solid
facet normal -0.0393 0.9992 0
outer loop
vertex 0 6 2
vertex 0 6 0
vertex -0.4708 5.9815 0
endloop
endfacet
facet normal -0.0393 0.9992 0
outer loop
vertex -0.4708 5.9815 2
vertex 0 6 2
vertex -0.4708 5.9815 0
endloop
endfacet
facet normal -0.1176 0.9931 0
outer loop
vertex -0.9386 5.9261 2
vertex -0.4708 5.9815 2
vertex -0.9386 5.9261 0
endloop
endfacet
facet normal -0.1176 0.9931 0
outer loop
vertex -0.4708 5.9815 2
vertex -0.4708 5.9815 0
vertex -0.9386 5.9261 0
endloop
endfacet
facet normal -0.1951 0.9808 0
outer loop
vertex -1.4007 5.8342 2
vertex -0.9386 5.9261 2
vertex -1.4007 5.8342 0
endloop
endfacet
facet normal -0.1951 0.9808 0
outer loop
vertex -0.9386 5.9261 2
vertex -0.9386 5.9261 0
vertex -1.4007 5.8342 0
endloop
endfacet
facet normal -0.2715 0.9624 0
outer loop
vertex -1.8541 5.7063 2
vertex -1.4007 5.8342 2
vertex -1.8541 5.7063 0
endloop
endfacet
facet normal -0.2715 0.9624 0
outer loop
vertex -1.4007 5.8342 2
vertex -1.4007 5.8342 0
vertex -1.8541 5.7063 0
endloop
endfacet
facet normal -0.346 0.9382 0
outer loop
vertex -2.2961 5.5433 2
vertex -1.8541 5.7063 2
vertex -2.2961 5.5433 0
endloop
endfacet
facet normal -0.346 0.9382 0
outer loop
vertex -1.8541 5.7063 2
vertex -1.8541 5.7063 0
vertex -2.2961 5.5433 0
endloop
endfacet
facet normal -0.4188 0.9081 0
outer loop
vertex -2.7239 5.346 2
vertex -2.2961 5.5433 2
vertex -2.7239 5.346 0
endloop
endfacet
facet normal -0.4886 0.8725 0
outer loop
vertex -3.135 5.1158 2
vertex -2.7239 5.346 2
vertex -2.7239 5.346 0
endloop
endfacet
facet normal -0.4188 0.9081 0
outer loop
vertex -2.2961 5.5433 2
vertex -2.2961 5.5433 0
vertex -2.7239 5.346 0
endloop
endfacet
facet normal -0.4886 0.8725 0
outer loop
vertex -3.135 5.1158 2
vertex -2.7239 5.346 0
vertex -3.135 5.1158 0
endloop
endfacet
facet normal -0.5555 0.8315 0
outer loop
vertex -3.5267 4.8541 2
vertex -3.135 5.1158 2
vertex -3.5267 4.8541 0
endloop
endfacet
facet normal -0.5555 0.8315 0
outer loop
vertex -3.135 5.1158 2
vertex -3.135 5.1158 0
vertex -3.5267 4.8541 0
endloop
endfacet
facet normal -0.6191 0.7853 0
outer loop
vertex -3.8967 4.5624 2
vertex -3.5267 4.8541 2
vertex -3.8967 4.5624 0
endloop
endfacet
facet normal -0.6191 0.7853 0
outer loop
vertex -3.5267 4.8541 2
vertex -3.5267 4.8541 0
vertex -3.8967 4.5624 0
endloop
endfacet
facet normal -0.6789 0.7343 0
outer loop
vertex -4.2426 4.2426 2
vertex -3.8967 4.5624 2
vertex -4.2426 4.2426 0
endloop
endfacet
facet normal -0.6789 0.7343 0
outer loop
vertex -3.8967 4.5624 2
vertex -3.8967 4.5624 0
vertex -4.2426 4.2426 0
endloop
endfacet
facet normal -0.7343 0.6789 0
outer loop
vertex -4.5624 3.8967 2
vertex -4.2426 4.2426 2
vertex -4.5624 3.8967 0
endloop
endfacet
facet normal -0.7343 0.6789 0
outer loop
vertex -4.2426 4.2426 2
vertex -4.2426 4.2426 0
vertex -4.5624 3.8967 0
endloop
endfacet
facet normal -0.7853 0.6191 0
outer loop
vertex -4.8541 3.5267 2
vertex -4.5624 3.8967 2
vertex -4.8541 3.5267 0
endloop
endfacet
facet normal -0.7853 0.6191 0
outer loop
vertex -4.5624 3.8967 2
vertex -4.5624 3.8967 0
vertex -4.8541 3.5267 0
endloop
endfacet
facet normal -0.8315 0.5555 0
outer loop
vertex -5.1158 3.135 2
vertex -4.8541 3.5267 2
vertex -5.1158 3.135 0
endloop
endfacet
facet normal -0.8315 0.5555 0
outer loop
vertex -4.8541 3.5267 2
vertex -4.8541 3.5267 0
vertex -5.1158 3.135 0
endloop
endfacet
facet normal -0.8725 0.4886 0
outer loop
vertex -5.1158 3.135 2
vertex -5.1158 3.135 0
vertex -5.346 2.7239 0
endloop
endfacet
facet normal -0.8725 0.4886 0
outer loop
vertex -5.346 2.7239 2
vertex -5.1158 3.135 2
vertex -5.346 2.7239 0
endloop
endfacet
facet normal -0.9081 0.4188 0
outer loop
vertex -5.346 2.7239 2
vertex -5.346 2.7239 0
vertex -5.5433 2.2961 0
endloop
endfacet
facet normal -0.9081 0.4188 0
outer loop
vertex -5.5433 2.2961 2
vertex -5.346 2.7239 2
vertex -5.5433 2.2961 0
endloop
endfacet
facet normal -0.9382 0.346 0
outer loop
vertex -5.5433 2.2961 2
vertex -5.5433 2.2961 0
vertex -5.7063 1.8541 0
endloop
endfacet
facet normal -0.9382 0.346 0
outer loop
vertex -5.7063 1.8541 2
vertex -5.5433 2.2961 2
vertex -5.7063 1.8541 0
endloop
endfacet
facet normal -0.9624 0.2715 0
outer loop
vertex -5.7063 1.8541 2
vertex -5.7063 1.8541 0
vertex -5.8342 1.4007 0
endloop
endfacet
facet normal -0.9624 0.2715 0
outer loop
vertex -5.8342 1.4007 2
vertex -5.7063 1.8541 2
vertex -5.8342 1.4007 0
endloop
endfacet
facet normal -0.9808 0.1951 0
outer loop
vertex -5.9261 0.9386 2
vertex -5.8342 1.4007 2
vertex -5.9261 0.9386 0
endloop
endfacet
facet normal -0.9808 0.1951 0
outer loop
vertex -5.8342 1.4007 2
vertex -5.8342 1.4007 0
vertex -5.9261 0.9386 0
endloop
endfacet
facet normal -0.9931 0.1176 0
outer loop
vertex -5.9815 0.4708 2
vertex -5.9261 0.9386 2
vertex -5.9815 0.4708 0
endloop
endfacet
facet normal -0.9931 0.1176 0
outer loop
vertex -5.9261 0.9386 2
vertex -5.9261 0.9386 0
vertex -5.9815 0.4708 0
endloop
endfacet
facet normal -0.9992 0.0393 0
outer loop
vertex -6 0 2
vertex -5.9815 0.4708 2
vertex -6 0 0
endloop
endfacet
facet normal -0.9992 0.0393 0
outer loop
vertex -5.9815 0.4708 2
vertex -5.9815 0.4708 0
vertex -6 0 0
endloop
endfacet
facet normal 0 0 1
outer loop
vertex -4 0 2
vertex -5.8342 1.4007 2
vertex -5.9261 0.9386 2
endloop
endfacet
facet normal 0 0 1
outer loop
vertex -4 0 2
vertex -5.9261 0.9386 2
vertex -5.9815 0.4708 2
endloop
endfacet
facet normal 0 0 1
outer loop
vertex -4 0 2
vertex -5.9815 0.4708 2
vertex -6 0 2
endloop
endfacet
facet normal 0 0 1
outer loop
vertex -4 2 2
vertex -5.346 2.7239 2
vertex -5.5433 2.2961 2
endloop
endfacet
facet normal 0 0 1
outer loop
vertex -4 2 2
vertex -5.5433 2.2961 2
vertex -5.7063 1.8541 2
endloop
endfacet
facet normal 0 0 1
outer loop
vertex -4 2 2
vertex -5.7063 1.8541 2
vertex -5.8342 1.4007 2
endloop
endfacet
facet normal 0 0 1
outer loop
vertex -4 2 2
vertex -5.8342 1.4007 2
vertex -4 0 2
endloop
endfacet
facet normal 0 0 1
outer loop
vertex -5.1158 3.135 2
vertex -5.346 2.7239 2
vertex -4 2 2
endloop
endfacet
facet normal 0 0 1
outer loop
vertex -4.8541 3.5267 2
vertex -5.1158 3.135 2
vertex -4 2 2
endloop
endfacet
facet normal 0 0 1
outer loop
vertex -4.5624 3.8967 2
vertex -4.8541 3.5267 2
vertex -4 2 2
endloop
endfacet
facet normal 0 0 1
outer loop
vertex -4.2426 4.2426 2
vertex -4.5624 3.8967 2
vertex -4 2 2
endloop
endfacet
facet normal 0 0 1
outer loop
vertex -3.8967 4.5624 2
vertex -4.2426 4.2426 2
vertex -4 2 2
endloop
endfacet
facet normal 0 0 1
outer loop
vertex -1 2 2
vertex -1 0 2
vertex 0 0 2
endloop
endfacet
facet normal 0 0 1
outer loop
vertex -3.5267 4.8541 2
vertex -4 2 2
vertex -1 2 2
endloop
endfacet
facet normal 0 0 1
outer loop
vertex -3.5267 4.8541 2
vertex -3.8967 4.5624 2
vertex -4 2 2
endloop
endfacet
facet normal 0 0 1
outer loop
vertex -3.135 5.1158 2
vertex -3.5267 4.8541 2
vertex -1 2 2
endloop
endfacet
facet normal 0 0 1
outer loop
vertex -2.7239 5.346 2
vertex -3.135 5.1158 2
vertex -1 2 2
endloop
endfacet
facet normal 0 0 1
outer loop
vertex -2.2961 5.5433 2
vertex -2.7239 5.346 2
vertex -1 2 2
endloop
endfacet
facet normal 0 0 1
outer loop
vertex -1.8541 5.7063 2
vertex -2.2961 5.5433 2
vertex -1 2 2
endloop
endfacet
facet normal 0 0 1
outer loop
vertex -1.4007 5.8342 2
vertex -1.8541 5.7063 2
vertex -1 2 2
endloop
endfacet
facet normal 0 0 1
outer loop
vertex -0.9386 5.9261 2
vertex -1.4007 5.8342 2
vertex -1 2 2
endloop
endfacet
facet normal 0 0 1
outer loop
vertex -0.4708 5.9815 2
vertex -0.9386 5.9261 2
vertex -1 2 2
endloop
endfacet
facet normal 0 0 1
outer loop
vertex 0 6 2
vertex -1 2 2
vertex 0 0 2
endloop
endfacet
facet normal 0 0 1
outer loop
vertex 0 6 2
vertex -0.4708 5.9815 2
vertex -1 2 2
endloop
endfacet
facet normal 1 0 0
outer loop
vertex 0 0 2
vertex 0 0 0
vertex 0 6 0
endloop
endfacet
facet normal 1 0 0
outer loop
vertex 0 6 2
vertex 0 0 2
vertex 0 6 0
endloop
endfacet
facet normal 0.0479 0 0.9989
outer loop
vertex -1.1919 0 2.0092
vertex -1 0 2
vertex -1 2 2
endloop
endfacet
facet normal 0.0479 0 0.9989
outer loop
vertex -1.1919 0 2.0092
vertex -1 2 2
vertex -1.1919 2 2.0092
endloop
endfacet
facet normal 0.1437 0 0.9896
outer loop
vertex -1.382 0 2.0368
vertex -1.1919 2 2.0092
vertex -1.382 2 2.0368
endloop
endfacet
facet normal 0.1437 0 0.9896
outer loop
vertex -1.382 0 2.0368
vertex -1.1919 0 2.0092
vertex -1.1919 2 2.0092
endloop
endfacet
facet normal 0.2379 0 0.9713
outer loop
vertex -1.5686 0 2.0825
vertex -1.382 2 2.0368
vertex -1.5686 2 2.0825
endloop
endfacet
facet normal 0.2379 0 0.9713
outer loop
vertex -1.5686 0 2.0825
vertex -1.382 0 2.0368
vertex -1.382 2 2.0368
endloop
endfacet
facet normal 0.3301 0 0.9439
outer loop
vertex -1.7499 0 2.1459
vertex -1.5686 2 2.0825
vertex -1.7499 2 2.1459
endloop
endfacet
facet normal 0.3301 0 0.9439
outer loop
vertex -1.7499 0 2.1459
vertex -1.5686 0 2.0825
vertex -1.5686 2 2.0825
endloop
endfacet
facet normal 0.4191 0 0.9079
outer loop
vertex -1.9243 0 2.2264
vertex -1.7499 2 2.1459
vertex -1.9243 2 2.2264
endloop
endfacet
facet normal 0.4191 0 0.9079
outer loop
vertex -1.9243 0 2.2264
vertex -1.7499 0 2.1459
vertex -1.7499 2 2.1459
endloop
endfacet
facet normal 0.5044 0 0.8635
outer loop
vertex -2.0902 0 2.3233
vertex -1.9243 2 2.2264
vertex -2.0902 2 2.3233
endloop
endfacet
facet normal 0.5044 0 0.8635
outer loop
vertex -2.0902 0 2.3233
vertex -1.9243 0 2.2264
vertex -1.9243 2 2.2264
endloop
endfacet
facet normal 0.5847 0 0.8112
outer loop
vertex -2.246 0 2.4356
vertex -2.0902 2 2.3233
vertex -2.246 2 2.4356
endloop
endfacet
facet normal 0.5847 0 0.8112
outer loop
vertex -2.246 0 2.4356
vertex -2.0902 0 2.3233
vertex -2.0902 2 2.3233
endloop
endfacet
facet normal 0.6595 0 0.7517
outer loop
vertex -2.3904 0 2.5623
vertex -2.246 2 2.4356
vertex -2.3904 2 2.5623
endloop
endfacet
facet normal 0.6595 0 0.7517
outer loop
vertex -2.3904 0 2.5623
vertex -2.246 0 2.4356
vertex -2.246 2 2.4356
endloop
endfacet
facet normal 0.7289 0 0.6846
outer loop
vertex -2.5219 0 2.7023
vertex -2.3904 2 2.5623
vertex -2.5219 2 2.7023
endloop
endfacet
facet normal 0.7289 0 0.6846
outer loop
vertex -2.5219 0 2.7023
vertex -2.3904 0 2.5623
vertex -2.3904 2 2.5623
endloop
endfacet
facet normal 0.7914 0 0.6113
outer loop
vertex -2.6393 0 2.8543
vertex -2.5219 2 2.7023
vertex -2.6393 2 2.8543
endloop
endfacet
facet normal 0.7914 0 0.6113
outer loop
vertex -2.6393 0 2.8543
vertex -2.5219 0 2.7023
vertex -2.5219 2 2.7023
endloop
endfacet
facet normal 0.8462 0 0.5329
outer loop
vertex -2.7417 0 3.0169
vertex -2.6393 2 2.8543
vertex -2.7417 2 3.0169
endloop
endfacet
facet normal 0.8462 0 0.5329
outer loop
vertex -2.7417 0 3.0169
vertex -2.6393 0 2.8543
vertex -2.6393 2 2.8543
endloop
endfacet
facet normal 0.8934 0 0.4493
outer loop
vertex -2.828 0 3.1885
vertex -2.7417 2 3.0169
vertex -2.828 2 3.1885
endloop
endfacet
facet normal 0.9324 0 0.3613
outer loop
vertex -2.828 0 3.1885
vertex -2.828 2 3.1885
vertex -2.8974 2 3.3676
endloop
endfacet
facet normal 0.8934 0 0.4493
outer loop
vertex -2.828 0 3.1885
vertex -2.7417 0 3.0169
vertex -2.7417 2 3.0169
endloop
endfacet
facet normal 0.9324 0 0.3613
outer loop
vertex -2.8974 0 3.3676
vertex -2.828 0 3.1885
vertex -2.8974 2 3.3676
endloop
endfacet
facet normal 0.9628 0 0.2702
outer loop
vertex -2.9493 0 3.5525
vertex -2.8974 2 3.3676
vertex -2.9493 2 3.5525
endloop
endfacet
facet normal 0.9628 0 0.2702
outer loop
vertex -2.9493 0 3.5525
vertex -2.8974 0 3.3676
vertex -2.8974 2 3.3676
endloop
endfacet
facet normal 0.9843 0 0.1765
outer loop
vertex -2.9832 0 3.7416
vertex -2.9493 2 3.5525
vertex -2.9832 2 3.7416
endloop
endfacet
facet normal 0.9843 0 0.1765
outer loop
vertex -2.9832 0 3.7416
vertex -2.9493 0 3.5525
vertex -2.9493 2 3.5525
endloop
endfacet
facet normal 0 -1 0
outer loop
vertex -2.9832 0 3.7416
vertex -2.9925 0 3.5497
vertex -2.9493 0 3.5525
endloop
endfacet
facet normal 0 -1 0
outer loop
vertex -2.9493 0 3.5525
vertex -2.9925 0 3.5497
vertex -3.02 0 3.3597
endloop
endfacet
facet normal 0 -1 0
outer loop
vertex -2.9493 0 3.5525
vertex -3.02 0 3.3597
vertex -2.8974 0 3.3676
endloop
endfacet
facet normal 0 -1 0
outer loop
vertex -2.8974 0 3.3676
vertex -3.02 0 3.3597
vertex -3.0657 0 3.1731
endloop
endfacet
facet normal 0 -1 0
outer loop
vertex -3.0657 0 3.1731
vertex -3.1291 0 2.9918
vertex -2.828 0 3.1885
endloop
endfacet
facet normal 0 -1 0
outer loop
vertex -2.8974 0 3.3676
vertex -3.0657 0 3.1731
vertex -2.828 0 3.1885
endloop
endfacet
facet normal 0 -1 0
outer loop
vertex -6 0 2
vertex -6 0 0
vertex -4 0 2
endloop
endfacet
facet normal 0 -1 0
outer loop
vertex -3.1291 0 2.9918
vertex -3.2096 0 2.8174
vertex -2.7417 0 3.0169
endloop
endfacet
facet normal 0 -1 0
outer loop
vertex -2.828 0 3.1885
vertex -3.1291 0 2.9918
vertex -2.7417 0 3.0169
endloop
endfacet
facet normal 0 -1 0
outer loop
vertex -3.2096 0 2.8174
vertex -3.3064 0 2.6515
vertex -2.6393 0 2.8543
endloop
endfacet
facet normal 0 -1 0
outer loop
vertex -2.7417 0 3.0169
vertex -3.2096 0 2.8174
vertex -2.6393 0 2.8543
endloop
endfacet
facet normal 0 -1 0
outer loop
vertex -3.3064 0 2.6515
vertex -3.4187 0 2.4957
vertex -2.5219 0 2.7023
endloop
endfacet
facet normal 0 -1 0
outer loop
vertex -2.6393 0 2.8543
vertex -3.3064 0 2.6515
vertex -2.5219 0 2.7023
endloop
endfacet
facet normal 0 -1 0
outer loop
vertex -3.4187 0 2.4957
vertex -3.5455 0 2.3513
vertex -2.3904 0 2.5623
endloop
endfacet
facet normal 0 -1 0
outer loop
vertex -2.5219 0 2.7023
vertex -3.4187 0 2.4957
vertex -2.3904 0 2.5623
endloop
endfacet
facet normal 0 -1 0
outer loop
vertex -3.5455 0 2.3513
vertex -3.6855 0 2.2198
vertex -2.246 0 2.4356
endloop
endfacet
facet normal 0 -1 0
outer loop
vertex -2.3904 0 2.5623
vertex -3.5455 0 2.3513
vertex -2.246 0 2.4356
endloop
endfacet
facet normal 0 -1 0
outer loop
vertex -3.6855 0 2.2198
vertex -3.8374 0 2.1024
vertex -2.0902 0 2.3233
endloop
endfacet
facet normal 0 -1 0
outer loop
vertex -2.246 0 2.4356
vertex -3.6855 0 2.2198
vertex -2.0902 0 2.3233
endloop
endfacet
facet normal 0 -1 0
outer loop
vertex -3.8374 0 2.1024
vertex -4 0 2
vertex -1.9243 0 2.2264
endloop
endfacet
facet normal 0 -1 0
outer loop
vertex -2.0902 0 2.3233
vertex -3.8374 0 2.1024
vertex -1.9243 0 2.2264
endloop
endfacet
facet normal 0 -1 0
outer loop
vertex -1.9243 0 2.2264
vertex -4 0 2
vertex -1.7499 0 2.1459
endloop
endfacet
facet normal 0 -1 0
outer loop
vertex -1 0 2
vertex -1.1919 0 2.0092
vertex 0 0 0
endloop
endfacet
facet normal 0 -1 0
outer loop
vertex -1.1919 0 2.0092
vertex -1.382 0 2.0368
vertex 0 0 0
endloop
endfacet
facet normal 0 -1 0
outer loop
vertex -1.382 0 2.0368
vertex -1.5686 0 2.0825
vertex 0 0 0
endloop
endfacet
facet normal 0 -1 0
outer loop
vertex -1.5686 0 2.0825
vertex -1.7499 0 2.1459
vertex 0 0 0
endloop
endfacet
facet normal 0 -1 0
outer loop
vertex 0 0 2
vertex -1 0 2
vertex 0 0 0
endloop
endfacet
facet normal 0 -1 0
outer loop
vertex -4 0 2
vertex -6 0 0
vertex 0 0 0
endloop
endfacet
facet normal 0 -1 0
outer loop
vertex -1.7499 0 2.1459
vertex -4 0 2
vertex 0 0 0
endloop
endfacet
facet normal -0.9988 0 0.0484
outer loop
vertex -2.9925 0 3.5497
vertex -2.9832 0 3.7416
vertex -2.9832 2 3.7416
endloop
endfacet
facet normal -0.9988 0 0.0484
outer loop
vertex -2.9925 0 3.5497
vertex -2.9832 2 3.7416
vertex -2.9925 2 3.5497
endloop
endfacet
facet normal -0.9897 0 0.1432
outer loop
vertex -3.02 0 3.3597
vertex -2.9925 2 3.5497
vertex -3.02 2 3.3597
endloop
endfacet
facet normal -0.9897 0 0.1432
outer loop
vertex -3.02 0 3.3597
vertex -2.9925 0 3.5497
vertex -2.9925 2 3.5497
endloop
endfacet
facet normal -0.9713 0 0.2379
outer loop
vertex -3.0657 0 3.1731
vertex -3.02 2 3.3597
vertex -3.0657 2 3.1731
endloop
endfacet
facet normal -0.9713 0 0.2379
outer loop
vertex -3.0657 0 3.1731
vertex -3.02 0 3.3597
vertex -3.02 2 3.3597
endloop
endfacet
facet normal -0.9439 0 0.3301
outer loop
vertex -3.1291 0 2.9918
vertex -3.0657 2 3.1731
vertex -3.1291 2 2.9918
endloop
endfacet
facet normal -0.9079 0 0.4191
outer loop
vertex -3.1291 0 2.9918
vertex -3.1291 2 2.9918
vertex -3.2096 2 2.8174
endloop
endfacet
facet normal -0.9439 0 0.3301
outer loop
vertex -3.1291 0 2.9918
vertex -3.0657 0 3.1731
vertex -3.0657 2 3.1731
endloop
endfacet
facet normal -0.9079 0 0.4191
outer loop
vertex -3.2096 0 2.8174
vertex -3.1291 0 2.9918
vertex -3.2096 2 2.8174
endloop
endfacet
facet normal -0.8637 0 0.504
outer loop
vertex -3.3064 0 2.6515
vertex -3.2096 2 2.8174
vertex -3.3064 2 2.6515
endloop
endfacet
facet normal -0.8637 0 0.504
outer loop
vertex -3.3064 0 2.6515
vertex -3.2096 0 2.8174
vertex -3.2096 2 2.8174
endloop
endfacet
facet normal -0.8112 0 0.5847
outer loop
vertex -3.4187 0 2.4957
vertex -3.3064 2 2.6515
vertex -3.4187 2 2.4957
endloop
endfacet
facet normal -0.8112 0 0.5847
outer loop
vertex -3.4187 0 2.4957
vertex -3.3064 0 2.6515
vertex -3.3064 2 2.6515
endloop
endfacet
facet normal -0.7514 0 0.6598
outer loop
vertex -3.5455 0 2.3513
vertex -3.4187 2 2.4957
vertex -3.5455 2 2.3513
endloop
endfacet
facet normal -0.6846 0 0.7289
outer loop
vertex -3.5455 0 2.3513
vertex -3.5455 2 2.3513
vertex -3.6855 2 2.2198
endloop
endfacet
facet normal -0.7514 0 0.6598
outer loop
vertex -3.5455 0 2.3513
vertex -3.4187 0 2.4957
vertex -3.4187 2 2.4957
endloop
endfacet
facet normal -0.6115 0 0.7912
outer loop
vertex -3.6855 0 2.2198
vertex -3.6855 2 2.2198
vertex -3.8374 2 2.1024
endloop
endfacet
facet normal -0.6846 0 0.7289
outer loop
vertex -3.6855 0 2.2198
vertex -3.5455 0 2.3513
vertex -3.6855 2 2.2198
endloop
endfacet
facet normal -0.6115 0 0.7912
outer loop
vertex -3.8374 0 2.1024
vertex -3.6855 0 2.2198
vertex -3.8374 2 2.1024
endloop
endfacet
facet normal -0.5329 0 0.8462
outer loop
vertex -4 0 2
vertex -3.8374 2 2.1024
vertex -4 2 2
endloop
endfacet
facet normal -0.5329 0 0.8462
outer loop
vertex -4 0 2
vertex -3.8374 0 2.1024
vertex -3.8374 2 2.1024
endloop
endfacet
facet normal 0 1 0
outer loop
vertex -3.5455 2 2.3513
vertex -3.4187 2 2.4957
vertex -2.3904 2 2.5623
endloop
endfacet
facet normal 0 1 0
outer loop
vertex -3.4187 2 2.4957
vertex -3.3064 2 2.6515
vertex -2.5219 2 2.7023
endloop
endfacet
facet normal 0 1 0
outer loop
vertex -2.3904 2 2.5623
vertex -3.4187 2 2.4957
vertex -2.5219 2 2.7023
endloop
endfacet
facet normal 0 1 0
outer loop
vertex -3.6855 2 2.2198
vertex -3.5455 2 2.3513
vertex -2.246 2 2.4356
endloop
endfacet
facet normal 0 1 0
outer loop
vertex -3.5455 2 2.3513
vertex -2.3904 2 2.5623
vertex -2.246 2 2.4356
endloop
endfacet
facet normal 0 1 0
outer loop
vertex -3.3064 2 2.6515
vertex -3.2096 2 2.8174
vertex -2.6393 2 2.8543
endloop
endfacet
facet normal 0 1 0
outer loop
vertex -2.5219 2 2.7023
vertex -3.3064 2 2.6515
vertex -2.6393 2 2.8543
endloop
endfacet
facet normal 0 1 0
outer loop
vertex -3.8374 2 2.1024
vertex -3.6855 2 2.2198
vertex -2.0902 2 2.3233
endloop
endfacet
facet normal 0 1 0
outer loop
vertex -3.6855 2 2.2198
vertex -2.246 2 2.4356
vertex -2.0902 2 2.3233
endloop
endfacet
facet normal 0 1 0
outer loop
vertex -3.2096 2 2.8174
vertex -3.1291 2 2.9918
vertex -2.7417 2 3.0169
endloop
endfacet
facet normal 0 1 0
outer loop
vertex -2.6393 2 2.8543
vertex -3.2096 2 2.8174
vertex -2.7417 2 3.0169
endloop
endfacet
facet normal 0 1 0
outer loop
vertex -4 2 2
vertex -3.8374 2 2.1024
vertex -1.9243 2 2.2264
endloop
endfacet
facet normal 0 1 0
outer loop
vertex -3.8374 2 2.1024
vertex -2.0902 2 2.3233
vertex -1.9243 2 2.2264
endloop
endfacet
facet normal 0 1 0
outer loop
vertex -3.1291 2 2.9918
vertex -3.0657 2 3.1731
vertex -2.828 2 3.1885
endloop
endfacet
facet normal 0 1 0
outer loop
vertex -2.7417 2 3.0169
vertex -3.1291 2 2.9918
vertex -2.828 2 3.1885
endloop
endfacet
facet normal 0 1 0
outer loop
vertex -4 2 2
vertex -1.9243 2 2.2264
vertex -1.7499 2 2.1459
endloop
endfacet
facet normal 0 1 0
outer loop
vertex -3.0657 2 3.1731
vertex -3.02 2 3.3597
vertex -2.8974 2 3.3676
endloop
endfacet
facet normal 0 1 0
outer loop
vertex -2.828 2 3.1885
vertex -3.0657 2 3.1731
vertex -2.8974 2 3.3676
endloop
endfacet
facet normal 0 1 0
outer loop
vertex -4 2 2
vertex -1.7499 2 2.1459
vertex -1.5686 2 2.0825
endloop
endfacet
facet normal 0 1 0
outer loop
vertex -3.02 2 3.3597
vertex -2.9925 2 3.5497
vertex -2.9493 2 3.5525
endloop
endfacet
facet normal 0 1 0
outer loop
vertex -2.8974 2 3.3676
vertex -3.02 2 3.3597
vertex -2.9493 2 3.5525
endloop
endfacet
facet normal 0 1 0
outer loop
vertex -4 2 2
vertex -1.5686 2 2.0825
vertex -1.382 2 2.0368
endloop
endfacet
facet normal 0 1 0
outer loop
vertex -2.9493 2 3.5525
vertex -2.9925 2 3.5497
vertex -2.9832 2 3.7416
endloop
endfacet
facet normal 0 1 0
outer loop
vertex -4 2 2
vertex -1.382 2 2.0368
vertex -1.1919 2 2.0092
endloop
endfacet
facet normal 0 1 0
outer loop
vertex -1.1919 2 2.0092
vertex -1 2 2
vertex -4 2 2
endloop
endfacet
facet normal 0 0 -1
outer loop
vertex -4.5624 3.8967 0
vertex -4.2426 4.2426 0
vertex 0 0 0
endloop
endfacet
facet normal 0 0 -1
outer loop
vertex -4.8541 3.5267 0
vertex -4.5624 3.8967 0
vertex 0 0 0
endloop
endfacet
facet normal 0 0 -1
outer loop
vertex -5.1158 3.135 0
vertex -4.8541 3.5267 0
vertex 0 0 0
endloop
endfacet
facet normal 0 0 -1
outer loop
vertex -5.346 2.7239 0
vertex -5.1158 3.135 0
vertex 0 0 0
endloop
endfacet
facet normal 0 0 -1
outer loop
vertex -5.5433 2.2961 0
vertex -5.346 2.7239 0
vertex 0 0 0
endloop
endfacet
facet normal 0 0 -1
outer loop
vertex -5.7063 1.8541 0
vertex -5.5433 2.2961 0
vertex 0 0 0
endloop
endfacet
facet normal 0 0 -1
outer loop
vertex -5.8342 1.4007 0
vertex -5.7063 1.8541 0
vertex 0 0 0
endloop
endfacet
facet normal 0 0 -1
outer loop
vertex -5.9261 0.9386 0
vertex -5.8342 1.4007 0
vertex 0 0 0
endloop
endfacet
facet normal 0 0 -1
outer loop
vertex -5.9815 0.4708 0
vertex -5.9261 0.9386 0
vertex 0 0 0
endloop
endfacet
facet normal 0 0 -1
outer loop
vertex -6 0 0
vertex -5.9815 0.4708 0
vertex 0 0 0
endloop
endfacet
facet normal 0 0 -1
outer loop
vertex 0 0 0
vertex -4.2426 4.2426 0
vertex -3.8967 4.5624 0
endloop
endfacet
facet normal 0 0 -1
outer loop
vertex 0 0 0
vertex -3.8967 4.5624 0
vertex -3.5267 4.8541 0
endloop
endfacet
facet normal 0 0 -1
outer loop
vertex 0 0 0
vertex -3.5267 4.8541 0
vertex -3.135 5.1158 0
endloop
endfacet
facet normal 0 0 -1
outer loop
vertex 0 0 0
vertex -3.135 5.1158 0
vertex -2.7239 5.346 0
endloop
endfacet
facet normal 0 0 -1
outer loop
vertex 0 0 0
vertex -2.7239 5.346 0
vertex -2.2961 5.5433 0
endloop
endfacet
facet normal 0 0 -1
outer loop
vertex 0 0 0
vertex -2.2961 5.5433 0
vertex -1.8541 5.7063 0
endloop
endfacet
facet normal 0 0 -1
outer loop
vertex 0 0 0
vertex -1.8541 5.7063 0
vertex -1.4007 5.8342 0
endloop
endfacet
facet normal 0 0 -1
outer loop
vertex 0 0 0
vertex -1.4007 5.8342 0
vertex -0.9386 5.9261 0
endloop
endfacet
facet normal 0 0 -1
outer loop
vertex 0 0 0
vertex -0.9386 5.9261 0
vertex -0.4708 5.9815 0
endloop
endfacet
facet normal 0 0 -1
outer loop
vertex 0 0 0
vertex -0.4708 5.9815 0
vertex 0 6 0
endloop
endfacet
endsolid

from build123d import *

# Parameters (mm, degrees)
BOSS_EXTRUDE1_DEPTH = 2
BOSS_EXTRUDE2_DEPTH = 2


with BuildPart() as part:
    # Sketch1 → Boss-Extrude1 (new body)
    with BuildSketch(Plane.XY):
        with BuildLine():
            Line((0, 0), (0, 6))
            ThreePointArc((0, 6), (-4.242640687, 4.242640687), (-6, 0))
            Line((-6, 0), (0, 0))
        make_face()
    extrude(amount=BOSS_EXTRUDE1_DEPTH)

    # Sketch2 → Boss-Extrude2 (add)
    with BuildSketch(Plane.XZ):
        with BuildLine():
            ThreePointArc((-2.983237378, 3.741602043), (-3.256022499, 2.733272353), (-3.999966142, 2))
            Line((-3.999966142, 2), (-1.000033858, 2))
            ThreePointArc((-1.000033858, 2), (-2.319710429, 2.497214459), (-2.983237378, 3.741602043))
        make_face()
    extrude(amount=-BOSS_EXTRUDE2_DEPTH)


solid = part.part
